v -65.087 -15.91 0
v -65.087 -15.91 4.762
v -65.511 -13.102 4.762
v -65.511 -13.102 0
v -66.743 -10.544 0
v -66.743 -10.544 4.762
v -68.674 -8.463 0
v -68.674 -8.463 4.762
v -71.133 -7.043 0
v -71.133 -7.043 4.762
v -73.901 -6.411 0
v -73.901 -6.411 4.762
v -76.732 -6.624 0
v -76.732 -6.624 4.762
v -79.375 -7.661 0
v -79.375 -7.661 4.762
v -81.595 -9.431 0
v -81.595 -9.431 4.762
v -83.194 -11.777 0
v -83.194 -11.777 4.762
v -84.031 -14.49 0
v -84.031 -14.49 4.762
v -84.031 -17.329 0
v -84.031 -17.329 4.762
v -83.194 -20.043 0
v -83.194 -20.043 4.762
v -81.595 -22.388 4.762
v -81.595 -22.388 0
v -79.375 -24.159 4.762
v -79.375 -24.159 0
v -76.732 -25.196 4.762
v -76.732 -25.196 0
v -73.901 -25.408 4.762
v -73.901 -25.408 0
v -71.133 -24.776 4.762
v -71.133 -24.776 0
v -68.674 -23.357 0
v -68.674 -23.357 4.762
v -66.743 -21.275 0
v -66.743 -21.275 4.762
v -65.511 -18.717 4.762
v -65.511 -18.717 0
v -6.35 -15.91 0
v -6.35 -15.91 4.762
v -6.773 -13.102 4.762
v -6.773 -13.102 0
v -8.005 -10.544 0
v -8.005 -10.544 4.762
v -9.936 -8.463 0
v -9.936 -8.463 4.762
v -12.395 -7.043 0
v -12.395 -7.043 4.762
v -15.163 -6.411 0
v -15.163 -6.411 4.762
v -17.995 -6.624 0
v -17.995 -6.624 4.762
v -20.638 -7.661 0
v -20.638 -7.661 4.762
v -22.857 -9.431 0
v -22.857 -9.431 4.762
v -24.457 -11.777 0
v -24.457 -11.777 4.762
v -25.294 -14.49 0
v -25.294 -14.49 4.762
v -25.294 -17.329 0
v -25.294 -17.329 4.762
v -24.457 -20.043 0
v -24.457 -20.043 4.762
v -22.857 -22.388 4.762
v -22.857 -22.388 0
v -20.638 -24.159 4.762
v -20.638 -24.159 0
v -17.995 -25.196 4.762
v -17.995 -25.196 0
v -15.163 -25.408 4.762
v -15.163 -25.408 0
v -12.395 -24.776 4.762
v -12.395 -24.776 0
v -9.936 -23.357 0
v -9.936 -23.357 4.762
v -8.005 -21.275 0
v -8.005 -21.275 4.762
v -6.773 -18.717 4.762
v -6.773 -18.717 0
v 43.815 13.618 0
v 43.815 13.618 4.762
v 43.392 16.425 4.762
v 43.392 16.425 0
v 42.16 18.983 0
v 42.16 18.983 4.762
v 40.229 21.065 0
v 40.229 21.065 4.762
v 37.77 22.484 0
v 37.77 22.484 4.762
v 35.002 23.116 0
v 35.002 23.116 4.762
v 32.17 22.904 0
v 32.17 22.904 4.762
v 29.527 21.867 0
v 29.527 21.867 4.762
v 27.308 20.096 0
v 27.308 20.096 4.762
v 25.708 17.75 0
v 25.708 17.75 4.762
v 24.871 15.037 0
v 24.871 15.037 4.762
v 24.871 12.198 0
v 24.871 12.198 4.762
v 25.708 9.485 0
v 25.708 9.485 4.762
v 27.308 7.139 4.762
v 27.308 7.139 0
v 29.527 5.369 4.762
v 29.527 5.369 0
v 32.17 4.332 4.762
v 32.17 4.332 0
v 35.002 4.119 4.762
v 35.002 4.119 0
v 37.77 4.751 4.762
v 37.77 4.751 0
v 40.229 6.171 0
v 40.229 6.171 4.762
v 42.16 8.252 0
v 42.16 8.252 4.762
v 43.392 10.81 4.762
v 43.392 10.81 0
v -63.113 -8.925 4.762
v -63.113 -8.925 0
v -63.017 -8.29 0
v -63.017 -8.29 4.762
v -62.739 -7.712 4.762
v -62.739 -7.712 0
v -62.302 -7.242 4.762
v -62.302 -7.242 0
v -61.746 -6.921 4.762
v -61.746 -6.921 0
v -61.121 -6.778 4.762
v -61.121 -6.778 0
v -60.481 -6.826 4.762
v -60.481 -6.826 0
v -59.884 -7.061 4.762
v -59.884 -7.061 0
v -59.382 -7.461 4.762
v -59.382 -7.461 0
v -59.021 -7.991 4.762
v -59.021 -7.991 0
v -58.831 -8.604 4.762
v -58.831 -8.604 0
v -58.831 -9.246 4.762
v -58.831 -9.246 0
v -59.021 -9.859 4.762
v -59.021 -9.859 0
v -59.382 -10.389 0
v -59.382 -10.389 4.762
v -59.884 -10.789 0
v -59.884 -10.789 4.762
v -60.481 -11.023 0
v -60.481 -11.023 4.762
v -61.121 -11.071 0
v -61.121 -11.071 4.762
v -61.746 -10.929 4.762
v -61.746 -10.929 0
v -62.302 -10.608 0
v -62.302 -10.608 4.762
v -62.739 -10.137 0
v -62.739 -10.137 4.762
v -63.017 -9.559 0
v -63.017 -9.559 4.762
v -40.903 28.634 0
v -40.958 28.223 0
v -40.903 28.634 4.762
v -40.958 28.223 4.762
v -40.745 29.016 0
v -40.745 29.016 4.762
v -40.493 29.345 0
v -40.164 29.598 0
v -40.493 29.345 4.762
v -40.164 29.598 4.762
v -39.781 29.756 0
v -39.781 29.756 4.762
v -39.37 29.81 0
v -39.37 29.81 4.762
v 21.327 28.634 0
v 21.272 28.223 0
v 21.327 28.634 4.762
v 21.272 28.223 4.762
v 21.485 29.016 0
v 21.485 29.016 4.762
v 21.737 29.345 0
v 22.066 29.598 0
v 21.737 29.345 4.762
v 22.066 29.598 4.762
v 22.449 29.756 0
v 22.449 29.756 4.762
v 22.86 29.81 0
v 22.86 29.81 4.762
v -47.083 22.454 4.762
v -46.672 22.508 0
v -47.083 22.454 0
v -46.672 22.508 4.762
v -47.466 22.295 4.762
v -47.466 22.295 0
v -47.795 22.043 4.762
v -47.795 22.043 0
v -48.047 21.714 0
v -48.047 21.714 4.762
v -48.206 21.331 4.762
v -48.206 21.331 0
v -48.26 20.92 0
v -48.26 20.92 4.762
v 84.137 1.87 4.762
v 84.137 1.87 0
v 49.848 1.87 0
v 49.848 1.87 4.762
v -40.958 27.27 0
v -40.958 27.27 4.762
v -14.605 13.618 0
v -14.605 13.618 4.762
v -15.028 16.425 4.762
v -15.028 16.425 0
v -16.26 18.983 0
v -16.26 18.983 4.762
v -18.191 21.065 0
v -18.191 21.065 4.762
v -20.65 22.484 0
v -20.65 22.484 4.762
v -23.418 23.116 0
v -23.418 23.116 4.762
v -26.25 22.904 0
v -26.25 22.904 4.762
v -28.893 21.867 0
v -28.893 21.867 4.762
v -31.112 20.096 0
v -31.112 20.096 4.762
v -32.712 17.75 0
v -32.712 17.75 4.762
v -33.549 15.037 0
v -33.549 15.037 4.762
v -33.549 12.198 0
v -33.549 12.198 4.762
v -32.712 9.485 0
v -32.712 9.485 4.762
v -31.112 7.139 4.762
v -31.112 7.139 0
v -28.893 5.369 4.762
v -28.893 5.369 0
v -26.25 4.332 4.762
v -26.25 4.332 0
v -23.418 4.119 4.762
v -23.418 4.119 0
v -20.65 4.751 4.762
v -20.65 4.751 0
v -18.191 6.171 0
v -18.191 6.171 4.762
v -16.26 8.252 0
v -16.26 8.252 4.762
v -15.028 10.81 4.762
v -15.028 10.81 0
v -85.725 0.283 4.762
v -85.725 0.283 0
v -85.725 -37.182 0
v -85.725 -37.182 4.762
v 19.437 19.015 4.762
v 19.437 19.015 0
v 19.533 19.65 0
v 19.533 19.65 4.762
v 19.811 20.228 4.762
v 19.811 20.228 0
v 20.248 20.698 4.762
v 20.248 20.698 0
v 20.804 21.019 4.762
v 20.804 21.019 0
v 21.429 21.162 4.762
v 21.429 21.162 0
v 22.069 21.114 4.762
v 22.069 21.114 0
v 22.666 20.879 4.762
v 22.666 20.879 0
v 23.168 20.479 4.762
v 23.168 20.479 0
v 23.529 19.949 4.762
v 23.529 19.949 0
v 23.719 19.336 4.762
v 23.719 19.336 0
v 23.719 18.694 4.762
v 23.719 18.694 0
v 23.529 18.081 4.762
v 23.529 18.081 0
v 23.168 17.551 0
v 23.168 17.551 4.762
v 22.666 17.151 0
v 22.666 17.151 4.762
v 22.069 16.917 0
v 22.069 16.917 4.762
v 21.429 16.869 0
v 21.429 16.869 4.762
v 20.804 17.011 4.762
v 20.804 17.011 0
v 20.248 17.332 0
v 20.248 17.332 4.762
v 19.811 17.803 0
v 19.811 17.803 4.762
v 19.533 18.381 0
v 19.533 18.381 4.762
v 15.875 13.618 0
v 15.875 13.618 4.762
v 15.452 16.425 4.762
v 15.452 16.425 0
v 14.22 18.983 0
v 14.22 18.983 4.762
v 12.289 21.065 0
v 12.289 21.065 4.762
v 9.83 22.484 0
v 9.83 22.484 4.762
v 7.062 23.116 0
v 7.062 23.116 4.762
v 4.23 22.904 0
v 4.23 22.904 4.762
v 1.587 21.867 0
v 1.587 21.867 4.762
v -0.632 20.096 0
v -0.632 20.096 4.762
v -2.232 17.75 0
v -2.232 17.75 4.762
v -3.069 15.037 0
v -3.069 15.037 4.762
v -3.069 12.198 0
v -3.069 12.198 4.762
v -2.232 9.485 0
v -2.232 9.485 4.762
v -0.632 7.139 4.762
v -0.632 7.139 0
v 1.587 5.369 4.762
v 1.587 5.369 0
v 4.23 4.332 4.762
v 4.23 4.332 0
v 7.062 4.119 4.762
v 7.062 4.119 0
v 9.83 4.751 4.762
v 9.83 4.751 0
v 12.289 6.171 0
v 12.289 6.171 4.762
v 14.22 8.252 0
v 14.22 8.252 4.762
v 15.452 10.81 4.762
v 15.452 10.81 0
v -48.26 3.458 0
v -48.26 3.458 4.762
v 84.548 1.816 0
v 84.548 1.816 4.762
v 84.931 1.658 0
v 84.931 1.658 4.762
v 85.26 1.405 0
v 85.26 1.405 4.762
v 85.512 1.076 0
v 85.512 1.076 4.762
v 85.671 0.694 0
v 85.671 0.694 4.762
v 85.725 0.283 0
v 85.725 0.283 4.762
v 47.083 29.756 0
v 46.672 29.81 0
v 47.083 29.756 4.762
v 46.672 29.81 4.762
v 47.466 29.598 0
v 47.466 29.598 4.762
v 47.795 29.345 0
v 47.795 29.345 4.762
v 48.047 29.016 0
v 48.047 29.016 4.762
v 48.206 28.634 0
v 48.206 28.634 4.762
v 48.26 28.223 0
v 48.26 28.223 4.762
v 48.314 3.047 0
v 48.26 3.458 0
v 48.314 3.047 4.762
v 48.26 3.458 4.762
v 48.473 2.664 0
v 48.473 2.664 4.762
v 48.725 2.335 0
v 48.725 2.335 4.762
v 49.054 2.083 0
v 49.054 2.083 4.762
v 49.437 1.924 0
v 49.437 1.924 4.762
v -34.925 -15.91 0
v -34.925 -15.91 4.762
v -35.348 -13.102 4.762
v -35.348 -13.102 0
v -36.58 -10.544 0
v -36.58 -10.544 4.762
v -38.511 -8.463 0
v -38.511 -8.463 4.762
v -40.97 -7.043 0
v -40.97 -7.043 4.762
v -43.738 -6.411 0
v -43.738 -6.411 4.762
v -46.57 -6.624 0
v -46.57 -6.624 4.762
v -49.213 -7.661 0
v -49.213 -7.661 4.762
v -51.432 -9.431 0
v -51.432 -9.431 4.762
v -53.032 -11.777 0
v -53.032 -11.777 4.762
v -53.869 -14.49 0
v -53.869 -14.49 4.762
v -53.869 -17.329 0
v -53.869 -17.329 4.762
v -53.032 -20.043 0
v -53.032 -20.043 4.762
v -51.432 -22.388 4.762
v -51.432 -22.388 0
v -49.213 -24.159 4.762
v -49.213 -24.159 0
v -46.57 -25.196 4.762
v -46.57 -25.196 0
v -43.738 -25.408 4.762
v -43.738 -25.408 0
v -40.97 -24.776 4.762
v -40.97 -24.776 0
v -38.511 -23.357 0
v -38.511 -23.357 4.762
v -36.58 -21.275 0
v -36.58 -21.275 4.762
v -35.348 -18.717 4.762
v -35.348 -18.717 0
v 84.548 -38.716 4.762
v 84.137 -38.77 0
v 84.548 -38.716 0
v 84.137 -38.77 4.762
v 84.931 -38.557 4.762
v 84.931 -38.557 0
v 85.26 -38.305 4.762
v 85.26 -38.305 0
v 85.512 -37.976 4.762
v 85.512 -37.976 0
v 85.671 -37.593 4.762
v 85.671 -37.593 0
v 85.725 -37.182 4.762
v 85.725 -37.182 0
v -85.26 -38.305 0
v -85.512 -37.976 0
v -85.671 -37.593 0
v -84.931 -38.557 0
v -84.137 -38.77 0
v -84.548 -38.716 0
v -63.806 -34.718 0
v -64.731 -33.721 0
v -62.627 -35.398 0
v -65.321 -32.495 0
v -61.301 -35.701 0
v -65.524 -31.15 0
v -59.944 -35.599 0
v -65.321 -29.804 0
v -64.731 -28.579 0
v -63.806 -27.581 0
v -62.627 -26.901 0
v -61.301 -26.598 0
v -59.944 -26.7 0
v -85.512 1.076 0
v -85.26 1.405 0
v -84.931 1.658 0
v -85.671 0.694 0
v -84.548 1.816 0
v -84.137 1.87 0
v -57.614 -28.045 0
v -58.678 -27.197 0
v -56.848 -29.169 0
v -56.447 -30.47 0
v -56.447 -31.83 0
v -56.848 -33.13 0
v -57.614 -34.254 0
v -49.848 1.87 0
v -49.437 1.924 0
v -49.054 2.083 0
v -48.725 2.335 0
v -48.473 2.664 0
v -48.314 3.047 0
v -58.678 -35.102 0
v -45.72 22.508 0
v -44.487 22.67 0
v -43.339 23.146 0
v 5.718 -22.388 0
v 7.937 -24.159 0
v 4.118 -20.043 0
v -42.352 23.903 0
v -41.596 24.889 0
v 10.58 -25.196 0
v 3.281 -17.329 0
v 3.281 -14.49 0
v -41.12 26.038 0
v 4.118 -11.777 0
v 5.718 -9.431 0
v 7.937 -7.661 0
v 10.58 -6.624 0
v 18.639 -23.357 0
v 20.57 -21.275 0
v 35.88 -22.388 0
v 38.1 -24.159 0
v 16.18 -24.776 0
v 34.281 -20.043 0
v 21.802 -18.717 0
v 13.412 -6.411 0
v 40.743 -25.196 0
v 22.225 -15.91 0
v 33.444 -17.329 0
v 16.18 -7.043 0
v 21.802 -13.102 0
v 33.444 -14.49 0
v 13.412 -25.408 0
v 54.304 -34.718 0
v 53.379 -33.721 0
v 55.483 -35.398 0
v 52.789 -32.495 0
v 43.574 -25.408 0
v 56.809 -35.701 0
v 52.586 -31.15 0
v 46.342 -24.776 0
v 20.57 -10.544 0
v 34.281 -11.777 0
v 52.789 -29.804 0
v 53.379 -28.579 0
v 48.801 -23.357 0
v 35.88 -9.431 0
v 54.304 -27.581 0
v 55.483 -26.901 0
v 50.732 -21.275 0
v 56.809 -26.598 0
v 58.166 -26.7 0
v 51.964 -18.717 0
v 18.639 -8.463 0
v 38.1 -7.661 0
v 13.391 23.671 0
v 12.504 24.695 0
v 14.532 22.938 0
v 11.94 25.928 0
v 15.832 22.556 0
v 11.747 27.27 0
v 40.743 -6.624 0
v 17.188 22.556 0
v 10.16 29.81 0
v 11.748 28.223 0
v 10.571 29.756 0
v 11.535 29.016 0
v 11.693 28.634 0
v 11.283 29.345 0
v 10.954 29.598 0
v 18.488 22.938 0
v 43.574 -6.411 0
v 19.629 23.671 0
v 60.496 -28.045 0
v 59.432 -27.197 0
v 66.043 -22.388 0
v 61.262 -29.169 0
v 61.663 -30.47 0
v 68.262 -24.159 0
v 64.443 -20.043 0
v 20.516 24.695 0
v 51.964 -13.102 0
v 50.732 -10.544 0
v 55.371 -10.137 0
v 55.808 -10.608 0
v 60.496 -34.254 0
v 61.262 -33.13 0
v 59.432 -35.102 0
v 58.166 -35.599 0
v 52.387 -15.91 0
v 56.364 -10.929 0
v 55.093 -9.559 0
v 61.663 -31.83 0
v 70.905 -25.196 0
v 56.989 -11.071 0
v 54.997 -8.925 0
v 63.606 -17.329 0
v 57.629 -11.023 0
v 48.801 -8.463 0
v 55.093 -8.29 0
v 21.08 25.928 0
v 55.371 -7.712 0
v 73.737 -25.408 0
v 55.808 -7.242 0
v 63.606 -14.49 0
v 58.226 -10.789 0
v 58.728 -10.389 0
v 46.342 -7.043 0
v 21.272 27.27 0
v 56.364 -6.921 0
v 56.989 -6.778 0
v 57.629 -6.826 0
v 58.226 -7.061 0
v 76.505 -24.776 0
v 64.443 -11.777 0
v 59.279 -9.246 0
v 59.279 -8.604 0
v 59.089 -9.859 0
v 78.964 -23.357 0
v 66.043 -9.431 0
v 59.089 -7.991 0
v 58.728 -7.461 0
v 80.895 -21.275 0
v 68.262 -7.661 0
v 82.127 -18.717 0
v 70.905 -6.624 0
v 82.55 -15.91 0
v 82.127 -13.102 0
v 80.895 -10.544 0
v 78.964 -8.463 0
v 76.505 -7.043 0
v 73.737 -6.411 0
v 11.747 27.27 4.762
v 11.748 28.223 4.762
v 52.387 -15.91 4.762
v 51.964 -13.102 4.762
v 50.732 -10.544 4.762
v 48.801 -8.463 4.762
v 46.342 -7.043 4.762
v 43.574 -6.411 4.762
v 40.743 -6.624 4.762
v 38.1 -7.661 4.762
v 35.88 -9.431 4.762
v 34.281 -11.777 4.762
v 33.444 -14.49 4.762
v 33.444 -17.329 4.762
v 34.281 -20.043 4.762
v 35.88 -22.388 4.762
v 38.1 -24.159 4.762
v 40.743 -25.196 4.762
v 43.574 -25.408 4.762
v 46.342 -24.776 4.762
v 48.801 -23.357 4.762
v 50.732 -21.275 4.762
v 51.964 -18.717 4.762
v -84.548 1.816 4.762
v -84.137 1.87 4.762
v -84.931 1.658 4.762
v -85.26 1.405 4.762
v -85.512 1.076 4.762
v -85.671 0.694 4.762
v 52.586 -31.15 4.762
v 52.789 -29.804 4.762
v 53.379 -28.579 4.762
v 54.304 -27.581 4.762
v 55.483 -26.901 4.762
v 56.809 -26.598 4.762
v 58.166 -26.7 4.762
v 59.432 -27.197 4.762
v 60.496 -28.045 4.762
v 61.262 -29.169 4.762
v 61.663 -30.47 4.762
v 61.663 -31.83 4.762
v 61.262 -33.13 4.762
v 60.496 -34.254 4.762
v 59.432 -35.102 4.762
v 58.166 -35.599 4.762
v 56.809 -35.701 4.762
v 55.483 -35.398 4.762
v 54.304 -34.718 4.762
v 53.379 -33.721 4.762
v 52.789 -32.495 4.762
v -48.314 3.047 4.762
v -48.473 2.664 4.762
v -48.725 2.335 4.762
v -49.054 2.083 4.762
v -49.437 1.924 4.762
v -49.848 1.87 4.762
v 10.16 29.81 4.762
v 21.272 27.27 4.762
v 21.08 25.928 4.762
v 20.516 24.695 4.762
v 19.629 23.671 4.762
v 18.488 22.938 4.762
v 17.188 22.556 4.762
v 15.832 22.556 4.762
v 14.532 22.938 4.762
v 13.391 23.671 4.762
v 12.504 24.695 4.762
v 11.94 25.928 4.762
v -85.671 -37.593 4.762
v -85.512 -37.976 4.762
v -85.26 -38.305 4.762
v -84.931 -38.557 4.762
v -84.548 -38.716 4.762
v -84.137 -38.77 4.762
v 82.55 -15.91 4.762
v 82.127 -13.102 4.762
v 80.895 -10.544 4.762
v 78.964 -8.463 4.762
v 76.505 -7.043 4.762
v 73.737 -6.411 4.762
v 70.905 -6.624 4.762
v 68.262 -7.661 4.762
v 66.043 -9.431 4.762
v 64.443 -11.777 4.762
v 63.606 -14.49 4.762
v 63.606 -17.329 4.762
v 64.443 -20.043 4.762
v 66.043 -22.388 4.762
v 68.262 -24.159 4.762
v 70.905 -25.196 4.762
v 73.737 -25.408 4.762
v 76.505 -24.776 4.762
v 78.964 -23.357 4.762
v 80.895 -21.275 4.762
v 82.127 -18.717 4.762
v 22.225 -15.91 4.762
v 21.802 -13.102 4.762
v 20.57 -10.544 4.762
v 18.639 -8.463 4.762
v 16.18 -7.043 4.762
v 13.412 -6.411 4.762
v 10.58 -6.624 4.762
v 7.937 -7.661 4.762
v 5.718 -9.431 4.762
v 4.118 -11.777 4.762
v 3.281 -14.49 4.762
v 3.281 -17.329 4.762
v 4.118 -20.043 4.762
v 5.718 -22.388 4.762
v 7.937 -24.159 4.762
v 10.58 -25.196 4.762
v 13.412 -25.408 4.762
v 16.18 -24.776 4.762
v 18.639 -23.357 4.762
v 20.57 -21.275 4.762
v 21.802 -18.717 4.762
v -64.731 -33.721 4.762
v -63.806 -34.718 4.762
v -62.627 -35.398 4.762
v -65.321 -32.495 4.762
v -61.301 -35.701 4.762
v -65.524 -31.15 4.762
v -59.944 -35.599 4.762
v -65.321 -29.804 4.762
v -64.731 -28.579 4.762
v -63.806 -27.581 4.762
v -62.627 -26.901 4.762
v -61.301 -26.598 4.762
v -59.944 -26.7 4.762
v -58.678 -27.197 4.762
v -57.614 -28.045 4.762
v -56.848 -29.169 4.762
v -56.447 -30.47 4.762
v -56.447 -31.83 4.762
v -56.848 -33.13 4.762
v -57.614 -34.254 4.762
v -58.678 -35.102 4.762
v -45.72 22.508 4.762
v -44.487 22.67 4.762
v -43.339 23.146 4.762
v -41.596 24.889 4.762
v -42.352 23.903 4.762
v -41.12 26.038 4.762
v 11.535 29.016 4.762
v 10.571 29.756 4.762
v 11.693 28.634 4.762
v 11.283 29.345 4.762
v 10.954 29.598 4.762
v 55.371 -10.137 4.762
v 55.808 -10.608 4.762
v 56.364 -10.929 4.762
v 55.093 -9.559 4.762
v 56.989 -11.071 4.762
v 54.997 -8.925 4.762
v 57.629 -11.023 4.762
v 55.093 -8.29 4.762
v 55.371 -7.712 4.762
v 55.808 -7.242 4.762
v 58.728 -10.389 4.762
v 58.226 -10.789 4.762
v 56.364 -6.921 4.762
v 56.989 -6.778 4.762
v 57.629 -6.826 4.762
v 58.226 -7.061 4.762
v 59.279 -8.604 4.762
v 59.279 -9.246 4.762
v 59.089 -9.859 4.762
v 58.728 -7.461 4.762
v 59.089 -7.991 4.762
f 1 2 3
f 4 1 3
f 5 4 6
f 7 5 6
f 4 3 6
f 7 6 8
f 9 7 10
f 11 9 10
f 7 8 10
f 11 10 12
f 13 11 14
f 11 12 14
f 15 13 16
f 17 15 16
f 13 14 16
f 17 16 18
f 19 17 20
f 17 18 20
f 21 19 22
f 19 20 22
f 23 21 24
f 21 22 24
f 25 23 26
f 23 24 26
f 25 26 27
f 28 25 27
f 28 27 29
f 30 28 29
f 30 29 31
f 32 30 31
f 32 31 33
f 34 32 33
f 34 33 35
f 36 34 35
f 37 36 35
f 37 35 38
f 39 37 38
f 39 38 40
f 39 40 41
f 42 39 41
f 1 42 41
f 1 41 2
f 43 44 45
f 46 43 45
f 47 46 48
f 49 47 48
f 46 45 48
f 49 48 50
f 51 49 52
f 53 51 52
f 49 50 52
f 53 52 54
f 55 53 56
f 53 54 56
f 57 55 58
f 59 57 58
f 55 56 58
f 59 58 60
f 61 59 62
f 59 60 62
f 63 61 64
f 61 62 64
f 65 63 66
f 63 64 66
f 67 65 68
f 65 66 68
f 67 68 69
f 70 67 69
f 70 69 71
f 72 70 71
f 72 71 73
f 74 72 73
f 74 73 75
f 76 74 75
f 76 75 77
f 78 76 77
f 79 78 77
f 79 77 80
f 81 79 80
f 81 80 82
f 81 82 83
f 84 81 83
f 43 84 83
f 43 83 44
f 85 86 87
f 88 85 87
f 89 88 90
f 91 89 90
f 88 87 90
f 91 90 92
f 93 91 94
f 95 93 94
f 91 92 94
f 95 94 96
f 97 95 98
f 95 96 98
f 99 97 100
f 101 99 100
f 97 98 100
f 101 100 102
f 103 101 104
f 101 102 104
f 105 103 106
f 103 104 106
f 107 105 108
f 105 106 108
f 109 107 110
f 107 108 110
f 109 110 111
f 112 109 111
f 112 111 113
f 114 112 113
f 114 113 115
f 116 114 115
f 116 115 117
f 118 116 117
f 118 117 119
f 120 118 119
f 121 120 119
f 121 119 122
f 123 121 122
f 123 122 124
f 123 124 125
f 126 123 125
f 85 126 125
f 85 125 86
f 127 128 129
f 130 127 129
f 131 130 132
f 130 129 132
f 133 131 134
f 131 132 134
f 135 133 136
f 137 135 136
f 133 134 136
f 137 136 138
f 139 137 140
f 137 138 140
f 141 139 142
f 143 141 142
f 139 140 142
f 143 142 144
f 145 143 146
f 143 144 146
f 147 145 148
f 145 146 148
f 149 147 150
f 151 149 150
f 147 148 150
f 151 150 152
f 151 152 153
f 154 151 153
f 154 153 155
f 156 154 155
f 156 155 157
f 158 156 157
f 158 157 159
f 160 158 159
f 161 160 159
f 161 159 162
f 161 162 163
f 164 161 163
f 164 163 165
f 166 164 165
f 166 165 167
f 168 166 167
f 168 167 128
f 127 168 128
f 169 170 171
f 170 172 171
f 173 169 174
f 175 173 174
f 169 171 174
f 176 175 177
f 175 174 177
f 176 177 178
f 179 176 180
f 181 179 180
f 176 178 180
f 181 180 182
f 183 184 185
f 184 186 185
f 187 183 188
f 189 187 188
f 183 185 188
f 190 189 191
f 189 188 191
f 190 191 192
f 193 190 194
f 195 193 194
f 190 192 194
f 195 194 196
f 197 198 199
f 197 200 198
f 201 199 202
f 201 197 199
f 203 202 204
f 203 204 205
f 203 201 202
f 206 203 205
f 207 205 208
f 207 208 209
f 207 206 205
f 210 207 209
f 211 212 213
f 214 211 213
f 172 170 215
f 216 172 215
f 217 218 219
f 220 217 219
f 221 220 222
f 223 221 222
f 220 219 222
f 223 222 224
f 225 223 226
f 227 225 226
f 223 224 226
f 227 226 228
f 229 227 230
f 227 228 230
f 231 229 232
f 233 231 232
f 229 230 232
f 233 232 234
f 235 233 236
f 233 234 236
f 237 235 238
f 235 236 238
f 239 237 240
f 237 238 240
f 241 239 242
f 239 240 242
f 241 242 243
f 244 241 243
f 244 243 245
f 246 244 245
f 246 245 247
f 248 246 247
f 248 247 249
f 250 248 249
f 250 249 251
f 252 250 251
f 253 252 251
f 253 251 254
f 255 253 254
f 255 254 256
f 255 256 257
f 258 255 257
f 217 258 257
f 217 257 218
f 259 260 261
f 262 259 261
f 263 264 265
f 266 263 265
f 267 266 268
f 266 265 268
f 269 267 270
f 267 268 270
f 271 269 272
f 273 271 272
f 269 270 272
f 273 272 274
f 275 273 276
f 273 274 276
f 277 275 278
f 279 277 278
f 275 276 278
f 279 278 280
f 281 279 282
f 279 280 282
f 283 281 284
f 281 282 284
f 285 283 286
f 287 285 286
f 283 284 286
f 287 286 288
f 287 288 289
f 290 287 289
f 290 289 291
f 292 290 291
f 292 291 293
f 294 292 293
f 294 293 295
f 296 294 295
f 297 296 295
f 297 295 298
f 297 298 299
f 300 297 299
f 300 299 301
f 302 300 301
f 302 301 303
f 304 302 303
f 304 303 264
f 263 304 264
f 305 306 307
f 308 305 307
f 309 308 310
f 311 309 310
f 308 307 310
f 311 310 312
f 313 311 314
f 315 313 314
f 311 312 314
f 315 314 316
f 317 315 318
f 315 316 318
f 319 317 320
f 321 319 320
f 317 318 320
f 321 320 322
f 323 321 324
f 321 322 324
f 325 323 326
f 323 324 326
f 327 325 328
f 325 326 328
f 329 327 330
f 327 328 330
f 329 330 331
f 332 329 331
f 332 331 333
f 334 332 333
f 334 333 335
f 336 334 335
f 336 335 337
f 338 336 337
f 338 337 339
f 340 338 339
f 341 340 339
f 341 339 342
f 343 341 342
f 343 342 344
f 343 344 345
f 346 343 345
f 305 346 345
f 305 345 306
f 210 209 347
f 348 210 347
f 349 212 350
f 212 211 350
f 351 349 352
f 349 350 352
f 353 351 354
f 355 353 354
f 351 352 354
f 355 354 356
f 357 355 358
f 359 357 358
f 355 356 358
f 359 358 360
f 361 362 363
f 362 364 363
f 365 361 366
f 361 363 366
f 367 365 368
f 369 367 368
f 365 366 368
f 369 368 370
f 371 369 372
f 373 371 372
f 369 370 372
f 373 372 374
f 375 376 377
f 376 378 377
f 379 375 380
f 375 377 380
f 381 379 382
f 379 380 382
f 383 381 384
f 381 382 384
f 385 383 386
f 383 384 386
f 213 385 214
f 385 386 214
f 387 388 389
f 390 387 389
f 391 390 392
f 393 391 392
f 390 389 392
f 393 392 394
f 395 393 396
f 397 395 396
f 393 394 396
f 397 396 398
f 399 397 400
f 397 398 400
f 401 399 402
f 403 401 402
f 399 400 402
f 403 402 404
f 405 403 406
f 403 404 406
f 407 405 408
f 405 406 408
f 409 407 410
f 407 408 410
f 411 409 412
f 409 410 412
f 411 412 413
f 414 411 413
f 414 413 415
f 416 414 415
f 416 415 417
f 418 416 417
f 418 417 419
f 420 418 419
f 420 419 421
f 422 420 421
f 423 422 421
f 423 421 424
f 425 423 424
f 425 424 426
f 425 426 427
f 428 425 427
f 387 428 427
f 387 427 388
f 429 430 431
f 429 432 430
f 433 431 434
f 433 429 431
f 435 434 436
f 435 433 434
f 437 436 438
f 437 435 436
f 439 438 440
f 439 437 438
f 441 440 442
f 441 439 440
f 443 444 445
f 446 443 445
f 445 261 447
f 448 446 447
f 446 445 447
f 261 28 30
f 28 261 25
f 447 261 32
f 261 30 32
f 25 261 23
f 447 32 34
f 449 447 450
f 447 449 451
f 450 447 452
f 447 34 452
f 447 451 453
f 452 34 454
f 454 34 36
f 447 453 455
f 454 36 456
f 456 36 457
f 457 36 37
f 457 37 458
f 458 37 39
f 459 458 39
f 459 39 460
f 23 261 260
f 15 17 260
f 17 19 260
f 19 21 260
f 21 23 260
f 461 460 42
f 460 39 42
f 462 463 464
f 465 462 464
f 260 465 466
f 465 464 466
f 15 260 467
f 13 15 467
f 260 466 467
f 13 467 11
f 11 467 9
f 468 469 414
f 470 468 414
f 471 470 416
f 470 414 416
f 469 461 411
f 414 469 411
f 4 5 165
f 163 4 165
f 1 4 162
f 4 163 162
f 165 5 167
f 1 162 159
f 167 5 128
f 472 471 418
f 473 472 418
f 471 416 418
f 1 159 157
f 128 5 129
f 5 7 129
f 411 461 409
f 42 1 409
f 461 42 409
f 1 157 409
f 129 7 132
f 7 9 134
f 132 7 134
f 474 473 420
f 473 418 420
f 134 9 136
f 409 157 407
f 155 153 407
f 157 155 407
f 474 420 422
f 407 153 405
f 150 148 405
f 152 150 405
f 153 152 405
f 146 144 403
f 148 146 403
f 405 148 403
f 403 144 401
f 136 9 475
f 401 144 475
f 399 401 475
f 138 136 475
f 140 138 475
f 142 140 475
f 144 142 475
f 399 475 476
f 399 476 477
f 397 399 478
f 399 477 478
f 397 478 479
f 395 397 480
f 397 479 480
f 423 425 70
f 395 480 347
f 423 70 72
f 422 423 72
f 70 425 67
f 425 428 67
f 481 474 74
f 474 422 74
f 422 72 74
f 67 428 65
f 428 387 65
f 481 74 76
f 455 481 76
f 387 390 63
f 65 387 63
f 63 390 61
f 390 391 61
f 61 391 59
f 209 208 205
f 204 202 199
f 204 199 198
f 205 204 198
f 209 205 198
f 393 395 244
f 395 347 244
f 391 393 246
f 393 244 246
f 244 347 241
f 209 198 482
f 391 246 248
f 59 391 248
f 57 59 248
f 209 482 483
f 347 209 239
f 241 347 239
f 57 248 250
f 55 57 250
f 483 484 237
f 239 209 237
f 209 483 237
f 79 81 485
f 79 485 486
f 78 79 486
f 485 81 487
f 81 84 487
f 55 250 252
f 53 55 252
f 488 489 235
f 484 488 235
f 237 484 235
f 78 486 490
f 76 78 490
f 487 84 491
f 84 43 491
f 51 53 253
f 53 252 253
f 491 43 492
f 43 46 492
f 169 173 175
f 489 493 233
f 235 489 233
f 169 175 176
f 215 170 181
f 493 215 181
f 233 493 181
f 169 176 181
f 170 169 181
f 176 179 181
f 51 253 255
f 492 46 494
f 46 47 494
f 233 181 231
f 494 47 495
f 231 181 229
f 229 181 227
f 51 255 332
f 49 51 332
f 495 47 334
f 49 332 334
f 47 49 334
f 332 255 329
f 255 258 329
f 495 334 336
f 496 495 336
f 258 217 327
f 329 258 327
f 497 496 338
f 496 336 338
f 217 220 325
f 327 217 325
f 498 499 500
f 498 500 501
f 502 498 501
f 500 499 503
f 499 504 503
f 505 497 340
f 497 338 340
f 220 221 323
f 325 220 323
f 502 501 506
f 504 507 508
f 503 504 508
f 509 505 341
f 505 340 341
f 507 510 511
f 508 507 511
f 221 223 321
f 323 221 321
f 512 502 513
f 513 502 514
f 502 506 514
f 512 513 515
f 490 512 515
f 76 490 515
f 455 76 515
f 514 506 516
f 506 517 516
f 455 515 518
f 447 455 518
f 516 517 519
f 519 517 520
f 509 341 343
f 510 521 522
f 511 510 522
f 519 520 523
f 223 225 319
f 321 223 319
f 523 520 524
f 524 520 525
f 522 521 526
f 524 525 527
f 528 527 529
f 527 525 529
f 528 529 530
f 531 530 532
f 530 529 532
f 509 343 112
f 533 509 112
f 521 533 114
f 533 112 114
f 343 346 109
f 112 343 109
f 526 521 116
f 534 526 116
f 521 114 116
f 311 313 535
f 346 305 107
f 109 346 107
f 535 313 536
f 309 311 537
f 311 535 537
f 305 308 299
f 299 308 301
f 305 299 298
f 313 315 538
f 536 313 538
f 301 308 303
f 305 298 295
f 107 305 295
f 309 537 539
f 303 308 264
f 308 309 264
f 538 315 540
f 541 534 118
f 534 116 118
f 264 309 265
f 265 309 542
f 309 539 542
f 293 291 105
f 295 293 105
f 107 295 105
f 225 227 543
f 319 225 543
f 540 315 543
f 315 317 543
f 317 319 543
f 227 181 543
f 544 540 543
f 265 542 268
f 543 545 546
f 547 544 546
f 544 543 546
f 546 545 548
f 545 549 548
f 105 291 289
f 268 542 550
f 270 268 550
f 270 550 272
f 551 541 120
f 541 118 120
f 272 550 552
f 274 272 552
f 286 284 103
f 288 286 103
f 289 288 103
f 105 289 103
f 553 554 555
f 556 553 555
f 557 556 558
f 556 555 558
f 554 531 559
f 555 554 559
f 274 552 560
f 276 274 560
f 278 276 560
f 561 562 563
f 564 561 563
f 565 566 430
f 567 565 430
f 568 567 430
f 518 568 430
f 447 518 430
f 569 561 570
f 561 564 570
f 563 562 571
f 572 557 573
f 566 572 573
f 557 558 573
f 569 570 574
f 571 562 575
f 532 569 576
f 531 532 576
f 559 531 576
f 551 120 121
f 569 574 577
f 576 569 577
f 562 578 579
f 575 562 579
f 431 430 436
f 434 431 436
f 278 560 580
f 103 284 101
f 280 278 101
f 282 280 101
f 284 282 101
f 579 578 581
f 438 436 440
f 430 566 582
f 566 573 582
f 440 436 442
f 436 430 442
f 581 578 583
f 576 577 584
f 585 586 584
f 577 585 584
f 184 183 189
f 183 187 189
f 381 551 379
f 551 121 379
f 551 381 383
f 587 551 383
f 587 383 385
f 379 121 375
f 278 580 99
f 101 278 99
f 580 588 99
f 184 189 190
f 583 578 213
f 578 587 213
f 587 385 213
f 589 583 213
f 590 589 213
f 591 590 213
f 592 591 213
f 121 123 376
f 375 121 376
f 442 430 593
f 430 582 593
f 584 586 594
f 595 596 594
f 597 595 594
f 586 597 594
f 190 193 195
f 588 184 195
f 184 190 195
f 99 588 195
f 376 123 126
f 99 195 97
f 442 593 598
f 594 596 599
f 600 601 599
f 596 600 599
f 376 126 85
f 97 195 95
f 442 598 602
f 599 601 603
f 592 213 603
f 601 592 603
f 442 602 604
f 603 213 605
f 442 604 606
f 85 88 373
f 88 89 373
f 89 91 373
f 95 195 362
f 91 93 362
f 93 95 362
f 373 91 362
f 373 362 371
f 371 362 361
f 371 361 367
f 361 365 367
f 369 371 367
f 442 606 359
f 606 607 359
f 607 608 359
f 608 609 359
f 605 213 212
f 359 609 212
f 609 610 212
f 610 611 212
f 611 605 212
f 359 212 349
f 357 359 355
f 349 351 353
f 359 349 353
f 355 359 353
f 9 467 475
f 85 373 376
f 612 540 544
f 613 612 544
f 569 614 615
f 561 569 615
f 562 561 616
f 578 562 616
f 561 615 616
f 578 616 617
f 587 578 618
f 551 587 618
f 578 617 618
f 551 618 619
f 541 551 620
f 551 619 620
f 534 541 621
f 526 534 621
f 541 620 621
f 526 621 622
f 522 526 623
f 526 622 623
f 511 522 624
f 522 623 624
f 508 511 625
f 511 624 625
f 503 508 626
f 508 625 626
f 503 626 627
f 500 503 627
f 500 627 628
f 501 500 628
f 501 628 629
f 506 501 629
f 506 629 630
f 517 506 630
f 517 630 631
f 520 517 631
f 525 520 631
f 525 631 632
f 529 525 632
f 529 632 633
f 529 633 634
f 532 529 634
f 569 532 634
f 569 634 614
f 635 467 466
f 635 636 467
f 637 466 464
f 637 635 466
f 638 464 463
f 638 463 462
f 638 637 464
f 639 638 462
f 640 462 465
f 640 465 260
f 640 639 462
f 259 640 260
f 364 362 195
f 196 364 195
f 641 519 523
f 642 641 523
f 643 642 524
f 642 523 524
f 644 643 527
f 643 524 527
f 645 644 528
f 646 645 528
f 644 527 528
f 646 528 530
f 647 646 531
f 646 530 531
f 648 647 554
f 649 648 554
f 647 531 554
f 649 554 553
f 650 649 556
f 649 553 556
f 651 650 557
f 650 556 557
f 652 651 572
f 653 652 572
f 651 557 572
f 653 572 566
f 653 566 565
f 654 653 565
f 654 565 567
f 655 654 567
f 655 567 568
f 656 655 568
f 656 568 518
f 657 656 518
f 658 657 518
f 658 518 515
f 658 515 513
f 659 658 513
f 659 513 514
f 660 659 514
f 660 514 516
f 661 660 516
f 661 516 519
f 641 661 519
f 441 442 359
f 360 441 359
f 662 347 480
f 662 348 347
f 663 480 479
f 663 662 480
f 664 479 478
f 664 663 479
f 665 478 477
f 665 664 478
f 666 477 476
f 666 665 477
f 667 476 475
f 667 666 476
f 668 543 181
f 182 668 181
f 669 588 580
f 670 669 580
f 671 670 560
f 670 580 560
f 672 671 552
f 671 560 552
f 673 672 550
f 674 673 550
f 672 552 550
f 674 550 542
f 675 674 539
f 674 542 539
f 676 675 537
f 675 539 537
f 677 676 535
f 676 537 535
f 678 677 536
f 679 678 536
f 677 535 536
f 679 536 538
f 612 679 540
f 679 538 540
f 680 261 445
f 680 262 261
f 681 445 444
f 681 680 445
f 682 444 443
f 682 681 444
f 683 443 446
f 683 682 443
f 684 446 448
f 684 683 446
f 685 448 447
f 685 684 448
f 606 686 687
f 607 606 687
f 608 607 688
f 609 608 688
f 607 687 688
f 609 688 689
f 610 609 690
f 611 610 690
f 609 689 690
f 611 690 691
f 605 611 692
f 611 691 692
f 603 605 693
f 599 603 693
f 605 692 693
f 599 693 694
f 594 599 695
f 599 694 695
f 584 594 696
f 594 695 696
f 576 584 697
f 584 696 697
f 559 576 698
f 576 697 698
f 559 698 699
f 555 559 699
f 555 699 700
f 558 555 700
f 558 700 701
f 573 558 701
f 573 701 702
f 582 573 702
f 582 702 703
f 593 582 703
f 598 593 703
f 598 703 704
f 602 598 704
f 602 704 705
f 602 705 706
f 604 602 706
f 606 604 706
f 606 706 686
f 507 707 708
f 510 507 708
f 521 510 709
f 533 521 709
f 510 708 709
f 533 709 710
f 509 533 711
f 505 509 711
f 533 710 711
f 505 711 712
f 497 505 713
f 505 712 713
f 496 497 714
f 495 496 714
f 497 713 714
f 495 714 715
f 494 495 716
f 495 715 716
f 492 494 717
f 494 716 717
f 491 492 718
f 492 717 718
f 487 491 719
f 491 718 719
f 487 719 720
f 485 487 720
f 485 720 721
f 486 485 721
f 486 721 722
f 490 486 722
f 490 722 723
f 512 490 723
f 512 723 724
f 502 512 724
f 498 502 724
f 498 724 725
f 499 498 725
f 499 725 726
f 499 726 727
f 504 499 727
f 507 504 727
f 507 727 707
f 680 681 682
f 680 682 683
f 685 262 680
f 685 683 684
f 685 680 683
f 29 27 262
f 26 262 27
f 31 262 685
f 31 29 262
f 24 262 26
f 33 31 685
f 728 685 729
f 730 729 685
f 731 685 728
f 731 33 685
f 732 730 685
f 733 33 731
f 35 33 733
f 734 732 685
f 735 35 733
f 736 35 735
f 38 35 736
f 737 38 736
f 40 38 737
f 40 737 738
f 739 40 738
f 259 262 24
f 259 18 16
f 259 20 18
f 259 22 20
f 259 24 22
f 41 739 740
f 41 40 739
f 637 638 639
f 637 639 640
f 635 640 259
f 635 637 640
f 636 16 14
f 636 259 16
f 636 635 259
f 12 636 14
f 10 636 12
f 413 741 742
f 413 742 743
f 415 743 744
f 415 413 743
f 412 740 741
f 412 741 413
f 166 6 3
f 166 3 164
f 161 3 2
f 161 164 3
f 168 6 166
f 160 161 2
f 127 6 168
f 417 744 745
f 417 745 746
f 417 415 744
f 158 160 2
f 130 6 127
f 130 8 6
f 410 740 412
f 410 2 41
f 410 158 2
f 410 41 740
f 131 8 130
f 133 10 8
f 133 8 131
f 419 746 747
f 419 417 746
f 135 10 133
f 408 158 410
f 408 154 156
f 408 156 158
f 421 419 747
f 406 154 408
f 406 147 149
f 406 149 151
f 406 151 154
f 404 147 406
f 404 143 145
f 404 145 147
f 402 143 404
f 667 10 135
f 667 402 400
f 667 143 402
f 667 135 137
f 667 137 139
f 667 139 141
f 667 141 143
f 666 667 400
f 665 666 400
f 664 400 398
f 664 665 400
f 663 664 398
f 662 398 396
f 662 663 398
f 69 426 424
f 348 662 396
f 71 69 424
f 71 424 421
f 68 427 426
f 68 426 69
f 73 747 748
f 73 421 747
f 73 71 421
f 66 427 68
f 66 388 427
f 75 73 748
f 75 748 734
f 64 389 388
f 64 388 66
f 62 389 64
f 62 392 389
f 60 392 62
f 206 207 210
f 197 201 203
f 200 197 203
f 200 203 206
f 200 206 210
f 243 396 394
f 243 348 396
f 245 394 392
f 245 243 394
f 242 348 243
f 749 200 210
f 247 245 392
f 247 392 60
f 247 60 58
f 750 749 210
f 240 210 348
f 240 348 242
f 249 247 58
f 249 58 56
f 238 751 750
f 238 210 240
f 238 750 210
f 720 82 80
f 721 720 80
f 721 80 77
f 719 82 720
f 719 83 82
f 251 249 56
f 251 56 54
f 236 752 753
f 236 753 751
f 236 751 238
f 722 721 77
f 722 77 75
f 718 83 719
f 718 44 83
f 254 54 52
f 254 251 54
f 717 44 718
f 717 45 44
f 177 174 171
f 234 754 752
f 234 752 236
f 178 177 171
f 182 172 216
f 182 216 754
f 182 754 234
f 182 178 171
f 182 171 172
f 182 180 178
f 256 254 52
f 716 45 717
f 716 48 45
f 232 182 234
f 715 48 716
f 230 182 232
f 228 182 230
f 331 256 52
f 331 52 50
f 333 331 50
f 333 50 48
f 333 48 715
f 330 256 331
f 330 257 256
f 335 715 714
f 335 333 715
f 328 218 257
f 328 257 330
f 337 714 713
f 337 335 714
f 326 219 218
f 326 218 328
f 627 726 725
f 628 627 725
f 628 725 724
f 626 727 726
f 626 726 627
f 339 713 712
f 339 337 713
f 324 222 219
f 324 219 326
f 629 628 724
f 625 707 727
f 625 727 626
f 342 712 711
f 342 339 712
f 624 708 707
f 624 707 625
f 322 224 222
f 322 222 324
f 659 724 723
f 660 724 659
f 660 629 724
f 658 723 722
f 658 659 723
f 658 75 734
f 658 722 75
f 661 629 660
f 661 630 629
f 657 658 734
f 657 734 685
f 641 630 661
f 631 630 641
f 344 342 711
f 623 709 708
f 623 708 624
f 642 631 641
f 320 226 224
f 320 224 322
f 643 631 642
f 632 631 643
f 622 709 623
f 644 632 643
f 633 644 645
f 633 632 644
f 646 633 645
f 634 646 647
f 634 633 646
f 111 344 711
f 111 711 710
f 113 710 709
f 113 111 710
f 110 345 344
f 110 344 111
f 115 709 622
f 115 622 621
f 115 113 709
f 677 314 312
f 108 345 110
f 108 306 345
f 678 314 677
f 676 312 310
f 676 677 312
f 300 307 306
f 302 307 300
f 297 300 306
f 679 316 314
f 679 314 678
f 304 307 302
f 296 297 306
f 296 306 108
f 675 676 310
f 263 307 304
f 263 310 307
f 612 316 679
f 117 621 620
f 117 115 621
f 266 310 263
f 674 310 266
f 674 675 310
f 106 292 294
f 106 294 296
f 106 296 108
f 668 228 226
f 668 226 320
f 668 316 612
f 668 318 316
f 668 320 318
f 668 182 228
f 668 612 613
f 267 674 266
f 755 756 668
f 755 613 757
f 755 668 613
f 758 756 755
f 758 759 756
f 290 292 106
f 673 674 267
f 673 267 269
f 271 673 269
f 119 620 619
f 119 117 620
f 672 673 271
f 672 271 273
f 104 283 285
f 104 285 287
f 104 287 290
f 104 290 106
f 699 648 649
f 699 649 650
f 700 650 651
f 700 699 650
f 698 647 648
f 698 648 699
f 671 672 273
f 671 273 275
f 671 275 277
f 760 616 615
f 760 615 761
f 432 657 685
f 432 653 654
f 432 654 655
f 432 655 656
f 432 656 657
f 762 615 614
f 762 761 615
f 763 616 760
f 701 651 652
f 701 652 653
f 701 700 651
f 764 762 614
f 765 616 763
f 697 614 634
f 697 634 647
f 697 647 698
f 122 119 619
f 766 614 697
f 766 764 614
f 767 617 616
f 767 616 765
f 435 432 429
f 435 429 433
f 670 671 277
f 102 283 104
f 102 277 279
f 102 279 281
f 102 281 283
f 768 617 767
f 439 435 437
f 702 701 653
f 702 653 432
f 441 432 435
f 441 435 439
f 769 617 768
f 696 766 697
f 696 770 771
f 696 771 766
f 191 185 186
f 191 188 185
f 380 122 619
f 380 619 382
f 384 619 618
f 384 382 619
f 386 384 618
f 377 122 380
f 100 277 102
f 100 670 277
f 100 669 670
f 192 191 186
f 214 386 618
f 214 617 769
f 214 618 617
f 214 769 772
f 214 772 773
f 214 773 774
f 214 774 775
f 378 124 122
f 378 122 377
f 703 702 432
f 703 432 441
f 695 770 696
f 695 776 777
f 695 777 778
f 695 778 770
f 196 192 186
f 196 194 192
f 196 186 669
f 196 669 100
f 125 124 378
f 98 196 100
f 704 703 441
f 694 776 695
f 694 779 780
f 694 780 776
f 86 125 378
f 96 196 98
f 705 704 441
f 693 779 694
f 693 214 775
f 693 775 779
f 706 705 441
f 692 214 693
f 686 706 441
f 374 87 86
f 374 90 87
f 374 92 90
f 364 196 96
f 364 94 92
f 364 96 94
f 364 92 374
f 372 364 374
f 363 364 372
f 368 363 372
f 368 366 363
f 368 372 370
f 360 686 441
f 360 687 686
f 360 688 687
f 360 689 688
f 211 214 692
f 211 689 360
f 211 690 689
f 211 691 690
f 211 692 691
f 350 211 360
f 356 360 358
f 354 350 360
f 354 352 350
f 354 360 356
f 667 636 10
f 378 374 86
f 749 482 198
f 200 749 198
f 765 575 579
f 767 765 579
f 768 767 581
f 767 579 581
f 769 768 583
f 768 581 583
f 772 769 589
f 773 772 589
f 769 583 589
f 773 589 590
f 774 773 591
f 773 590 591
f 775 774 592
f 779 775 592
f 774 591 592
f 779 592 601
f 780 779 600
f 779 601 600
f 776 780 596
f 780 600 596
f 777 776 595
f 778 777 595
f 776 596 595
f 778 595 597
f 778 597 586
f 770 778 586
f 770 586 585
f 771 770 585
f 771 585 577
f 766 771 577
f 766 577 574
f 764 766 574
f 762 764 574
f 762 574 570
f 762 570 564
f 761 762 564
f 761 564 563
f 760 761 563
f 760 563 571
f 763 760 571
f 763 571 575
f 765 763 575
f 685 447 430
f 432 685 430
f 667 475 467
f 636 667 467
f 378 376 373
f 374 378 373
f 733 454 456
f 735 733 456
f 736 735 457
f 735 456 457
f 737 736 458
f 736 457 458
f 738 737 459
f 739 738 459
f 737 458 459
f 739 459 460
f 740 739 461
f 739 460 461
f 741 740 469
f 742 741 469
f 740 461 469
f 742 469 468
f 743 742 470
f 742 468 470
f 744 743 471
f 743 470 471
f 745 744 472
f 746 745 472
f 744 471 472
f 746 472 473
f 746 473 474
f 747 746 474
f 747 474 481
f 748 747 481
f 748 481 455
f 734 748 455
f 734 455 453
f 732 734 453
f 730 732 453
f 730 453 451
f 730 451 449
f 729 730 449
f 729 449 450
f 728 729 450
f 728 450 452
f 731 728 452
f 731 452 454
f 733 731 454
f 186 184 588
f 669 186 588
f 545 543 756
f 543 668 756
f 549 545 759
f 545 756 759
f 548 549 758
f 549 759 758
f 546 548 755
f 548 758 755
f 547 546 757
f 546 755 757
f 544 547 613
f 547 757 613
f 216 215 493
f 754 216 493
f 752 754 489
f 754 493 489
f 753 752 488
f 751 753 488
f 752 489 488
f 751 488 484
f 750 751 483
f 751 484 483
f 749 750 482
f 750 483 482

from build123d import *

# Parameters (mm, degrees)
BOSS_EXTRUDE1_DEPTH              = 4.7625
SKETCH3_R                        = 9.525
CUT_EXTRUDE1_DEPTH               = 5.7625
F_6_CLEARANCE_HOLE1_D            = 4.3053
F_23_64_0_35938_DIAMETER_HOLE1_D = 9.128252
FILLET1_R                        = 1.5875


with BuildPart() as part:
    # Sketch1 → Boss-Extrude1 (new body)
    with BuildSketch(Plane.XY):
        with BuildLine():
            Line((-40.9575, 29.810203833), (-40.9575, 27.270203833))
            ThreePointArc((-40.9575, 27.270203833), (-42.352403955, 23.902607788), (-45.72, 22.507703833))
            Line((-45.72, 22.507703833), (-48.26, 22.507703833))
            Line((-48.26, 22.507703833), (-48.26, 1.870203833))
            Line((-48.26, 1.870203833), (-85.725, 1.870203833))
            Line((-85.725, 1.870203833), (-85.725, -38.769796167))
            Line((-85.725, -38.769796167), (85.725, -38.769796167))
            Line((85.725, -38.769796167), (85.725, 1.870203833))
            Line((85.725, 1.870203833), (48.26, 1.870203833))
            Line((48.26, 1.870203833), (48.26, 29.810203833))
            Line((48.26, 29.810203833), (21.2725, 29.810203833))
            Line((21.2725, 29.810203833), (21.2725, 27.270203833))
            ThreePointArc((21.2725, 27.270203833), (16.51, 22.507703833), (11.7475, 27.270203833))
            Line((11.7475, 27.270203833), (11.7475, 29.810203833))
            Line((11.7475, 29.810203833), (-40.9575, 29.810203833))
        make_face()
    extrude(amount=BOSS_EXTRUDE1_DEPTH)

    # Sketch3 → Cut-Extrude1 (cut, through all)
    with BuildSketch(Plane.XY.offset(4.7625)):
        with Locations((73.025, -15.909796167)):
            Circle(SKETCH3_R)
        with Locations((42.8625, -15.909796167)):
            Circle(SKETCH3_R)
        with Locations((12.7, -15.909796167)):
            Circle(SKETCH3_R)
        with Locations((-15.875, -15.909796167)):
            Circle(SKETCH3_R)
        with Locations((-44.45, -15.909796167)):
            Circle(SKETCH3_R)
        with Locations((-74.6125, -15.909796167)):
            Circle(SKETCH3_R)
        with Locations((34.29, 13.617703833)):
            Circle(SKETCH3_R)
        with Locations((6.35, 13.617703833)):
            Circle(SKETCH3_R)
        with Locations((-24.13, 13.617703833)):
            Circle(SKETCH3_R)
    extrude(amount=-CUT_EXTRUDE1_DEPTH, mode=Mode.SUBTRACT)

    # #6 Clearance Hole1 (through all)
    with Locations(Plane.XY.offset(4.7625)):
        with Locations((57.15, -8.924796167), (21.59, 19.015203833), (-60.96, -8.924796167)):
            Hole(F_6_CLEARANCE_HOLE1_D / 2)

    # 23/64 (0.35938) Diameter Hole1 (through all)
    with Locations(Plane.XY.offset(4.7625)):
        with Locations((57.15, -31.149796167), (-60.96, -31.149796167)):
            Hole(F_23_64_0_35938_DIAMETER_HOLE1_D / 2)

    # Fillet1
    fillet1_edges = [part.edges().sort_by_distance(p)[0] for p in [
        (11.7475, 29.810203833, 2.38125),
        (21.2725, 29.810203833, 2.38125),
        (48.26, 29.810203833, 2.38125),
        (48.26, 1.870203833, 2.38125),
        (85.725, 1.870203833, 2.38125),
        (85.725, -38.769796167, 2.38125),
        (-85.725, -38.769796167, 2.38125),
        (-85.725, 1.870203833, 2.38125),
        (-48.26, 1.870203833, 2.38125),
        (-48.26, 22.507703833, 2.38125),
        (-40.9575, 29.810203833, 2.38125),
    ]]
    fillet(fillet1_edges, radius=FILLET1_R)


solid = part.part
